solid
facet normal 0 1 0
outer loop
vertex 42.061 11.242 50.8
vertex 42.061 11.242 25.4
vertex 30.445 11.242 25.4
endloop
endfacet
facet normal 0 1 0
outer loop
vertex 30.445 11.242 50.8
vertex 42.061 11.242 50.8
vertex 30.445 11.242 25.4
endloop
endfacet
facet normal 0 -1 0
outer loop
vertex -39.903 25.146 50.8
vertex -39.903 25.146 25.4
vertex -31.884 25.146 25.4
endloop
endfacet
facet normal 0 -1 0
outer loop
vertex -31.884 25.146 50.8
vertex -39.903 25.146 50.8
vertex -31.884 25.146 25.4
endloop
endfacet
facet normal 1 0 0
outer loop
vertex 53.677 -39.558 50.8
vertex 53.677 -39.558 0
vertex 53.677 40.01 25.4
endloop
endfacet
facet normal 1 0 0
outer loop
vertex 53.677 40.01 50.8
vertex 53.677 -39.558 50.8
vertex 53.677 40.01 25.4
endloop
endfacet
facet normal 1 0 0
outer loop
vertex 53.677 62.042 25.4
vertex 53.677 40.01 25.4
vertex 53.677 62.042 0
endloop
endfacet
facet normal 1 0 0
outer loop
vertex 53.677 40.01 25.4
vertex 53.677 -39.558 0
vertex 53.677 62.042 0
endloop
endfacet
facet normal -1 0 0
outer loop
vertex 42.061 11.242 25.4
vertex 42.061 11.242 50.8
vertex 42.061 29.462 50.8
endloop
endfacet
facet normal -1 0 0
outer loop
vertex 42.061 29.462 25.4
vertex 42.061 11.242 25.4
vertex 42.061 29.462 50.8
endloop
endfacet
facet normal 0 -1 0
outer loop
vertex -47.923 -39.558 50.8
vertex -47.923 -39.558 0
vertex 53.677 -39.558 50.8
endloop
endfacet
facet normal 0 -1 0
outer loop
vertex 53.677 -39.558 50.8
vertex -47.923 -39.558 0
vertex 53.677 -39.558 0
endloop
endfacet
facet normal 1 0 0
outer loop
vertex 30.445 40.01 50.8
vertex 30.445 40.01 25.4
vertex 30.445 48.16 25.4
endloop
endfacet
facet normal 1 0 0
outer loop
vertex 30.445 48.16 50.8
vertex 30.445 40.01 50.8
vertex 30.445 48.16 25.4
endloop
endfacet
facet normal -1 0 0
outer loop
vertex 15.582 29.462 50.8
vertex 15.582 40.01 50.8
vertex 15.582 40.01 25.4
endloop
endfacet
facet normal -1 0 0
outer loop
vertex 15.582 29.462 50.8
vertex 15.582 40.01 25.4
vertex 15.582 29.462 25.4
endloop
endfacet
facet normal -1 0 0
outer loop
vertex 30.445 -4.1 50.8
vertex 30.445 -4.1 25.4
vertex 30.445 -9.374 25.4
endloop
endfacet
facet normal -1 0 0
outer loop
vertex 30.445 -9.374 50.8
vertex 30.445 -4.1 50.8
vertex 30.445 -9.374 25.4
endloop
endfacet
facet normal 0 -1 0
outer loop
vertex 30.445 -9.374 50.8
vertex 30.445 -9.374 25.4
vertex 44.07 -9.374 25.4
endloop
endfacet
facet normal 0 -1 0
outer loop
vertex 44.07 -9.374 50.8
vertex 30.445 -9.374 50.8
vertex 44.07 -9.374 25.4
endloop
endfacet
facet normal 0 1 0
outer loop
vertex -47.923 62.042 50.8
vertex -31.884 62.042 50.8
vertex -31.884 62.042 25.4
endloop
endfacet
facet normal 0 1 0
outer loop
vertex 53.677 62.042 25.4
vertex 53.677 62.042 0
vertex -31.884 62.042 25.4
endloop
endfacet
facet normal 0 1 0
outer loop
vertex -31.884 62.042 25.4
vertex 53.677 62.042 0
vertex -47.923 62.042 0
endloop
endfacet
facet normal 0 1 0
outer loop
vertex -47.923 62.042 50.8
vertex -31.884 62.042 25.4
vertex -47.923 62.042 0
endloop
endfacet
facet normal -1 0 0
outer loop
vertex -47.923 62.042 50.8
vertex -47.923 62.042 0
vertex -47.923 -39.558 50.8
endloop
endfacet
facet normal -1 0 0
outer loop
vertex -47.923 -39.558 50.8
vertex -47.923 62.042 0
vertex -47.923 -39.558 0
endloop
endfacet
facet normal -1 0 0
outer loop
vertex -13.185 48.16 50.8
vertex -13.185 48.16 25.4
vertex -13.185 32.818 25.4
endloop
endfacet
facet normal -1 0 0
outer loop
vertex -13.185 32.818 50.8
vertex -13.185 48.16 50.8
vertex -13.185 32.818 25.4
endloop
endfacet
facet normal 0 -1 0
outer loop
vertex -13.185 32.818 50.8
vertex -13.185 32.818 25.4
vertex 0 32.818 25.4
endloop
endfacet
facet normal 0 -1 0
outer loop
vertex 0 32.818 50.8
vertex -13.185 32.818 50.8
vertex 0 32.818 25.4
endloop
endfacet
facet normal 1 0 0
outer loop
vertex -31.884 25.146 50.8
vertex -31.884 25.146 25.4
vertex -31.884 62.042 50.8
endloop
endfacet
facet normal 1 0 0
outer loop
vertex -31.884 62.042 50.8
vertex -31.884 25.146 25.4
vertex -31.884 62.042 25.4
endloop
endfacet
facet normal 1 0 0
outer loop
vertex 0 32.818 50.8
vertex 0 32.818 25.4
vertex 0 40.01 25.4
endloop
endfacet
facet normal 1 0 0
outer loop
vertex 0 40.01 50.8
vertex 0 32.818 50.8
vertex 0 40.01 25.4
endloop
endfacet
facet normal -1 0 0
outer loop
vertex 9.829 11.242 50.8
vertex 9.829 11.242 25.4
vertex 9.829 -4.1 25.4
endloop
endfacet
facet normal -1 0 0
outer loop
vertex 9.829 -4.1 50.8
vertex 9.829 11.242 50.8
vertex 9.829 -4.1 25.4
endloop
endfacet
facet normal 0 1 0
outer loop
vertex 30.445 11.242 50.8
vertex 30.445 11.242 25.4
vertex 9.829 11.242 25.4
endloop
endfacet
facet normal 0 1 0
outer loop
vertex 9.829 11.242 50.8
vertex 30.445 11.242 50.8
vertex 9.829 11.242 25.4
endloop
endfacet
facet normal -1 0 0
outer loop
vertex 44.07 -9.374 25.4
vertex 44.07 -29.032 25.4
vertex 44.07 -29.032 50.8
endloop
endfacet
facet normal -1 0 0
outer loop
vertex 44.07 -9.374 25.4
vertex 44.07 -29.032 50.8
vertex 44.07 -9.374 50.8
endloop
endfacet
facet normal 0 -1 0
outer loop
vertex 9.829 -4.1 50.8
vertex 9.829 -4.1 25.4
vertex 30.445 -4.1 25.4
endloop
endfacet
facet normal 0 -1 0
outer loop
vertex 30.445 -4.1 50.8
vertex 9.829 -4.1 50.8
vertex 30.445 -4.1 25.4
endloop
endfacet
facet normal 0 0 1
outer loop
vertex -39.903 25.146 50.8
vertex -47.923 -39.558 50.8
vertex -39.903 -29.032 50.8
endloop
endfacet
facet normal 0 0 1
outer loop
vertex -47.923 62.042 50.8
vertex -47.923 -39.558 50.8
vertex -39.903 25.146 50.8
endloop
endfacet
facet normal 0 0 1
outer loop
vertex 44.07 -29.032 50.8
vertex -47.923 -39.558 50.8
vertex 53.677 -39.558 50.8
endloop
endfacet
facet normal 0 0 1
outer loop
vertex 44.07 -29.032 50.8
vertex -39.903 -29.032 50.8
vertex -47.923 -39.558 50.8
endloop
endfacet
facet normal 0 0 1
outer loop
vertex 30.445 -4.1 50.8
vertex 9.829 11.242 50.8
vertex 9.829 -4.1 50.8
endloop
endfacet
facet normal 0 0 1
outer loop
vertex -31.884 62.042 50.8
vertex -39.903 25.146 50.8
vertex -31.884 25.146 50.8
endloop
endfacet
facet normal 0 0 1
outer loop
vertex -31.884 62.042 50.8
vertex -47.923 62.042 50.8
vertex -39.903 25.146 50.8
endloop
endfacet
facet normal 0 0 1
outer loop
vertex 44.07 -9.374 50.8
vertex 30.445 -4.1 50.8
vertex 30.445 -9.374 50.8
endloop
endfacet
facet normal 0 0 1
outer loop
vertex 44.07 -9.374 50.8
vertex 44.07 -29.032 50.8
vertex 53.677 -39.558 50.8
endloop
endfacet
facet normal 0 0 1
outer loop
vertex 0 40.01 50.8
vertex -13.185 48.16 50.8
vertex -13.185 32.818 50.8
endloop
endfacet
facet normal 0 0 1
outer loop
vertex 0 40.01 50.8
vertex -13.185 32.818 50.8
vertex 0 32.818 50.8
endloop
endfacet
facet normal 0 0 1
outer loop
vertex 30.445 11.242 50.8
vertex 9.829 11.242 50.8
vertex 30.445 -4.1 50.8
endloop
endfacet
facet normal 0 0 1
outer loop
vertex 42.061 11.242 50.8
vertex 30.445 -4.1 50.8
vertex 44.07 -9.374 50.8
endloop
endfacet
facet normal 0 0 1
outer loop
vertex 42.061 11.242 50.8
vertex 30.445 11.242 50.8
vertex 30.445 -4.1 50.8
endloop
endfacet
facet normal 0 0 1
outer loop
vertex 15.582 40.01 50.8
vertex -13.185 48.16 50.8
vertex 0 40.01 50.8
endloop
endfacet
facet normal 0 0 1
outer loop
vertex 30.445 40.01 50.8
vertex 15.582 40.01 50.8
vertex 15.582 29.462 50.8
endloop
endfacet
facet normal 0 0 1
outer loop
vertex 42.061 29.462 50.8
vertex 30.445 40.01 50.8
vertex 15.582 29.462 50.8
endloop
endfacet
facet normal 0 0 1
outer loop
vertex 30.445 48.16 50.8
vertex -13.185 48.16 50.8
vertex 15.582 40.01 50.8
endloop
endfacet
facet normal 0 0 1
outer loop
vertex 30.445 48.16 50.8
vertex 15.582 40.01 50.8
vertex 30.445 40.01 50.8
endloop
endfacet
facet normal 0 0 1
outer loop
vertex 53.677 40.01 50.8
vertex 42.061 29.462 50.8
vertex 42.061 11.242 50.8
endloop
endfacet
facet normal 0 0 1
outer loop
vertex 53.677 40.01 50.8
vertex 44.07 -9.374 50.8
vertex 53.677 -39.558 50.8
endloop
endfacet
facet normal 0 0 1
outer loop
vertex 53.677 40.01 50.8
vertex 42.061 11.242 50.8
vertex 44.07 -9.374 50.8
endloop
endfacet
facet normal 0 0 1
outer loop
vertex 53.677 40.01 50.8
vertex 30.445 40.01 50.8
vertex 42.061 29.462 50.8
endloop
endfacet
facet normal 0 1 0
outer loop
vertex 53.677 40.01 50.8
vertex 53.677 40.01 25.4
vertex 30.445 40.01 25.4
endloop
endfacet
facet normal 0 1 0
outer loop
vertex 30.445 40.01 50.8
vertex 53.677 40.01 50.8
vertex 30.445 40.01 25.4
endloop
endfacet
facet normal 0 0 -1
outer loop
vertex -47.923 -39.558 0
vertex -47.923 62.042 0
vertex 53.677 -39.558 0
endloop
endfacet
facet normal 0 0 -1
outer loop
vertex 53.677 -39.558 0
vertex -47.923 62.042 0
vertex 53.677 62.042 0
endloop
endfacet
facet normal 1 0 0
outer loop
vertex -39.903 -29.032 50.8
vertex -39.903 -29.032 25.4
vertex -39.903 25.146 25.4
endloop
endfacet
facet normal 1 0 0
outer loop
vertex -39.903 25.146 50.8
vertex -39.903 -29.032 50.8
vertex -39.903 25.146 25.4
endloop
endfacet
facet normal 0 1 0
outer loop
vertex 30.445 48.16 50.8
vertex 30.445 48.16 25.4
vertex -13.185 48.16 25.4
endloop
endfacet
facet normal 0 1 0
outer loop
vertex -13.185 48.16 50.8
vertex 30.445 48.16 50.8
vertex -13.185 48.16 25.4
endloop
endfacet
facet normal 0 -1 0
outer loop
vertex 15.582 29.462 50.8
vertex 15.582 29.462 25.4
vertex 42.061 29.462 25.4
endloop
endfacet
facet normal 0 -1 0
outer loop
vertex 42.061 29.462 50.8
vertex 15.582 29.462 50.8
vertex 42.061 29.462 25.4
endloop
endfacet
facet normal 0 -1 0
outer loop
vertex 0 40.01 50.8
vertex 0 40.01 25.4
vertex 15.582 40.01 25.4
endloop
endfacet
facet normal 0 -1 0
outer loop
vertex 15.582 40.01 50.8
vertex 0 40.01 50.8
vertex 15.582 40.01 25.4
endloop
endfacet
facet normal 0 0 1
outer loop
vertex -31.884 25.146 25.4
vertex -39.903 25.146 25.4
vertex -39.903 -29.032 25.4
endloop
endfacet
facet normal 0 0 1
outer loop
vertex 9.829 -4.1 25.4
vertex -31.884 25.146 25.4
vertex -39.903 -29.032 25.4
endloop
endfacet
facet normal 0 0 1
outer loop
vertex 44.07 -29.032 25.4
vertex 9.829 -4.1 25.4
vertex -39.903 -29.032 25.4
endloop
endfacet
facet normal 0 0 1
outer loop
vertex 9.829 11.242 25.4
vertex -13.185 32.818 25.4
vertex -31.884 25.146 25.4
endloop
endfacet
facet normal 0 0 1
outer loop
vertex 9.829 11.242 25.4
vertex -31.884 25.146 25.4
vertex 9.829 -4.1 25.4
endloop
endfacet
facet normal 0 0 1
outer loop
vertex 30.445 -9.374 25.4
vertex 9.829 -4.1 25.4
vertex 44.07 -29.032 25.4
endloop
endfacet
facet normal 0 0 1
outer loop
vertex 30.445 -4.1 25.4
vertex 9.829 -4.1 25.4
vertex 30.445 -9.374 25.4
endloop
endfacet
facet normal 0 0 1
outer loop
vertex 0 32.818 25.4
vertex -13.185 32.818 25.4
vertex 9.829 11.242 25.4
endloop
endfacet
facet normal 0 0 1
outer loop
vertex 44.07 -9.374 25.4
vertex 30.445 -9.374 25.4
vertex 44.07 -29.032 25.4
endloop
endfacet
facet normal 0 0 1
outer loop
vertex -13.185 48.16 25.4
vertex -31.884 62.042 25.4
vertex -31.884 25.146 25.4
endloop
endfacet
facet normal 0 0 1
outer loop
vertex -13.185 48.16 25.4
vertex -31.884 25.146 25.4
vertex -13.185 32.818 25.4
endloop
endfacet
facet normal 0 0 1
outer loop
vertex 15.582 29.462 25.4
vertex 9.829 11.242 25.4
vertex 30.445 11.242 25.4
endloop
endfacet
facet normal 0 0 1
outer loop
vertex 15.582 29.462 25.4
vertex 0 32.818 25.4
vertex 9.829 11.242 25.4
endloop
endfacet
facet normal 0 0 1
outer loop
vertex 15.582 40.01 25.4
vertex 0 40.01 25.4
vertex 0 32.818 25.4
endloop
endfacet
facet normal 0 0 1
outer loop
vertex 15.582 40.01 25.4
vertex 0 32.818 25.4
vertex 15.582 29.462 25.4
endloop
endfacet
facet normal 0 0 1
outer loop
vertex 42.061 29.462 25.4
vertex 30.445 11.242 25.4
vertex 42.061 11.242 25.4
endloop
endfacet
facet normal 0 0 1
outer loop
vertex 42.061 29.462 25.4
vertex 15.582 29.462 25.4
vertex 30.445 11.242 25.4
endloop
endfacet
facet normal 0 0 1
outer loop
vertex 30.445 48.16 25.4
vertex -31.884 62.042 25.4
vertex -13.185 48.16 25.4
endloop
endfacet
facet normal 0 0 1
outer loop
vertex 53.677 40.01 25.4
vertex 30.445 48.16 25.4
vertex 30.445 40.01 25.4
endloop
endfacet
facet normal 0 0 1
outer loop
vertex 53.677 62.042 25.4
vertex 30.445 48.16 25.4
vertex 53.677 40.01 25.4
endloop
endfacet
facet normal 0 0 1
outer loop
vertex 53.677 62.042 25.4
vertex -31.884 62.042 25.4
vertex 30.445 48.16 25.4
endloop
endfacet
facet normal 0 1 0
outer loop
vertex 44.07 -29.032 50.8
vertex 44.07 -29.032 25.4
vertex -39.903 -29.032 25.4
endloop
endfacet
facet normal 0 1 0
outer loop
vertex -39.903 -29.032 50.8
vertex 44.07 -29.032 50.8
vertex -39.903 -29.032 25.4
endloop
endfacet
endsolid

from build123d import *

# Parameters (mm, degrees)
F0_W     = 101.6
F0_H     = 101.6
F1_DEPTH = 25.4
F2_W     = 9.6067792356
F2_H     = 19.6575643495
F2_W_2   = 23.4931828454
F2_H_2   = 10.5259682656
F2_W_3   = 8.0198350638
F2_H_3   = 12.465775013
F2_H_4   = 41.7123902589
F2_W_4   = 11.6157357857
F2_H_5   = 18.2192062081
F3_DEPTH = 25.4


# Not quite as in the source:
# - ends of sketch curves that miss each other by under 0.0002 mm in the source are joined


with BuildPart() as f1:
    # F0 (on Top) → F1 (new body)
    with BuildSketch(Plane.XY):
        with Locations((2.876713872, 11.2423545628)):
            Rectangle(F0_W, F0_H)
    extrude(amount=F1_DEPTH)

    # F2 (on face) → F3 (join)
    with BuildSketch(Plane.XY.offset(25.4)):
        Polygon((-31.8836160004, 25.1464881003), (-31.8836160004, 62.0423545628), (-47.923286128, 62.0423545628), (-47.923286128, 25.1464881003), (-39.9034510642, 25.1464881003), align=None)
        Polygon((0, 32.8177288175), (0, 40.0095209479), (0, 48.1602139771), (-13.1849600002, 48.1602139771), (-13.1849600002, 32.8177288175), align=None)
        Polygon((15.5822057277, 40.0095209479), (30.4452423006, 40.0095209479), (30.4452423006, 48.1602139771), (0, 48.1602139771), (0, 40.0095209479), align=None)
        Polygon((42.0609780863, 29.4615607709), (53.676713872, 29.4615607709), (53.676713872, 40.0095209479), (30.4452423006, 40.0095209479), (15.5822057277, 40.0095209479), (15.5822057277, 29.4615607709), align=None)
        Polygon((30.4452423006, -4.1001341306), (30.4452423006, 11.2423545628), (9.8287723958, 11.2423505634), (9.8287723958, -4.1001341306), align=None)
        Polygon((44.0699346364, -9.3741128221), (53.676713872, -9.3741128221), (53.676713872, 11.2423545628), (42.0609780863, 11.2423545628), (30.4452423006, 11.2423545628), (30.4452423006, -4.1001341306), (30.4452423006, -9.3741128221), (42.0609780863, -9.3741128221), align=None)
        with Locations((48.8733242542, -19.2028949969)):
            Rectangle(F2_W, F2_H)
        Polygon((53.676713872, -39.5576454372), (53.676713872, -29.0316771716), (44.0699346364, -29.0316771716), (42.0609780863, -29.0316771716), (-8.390433155, -29.0316771716), (-8.390433155, -39.5576454372), align=None)
        with Locations((-20.1370245777, -34.2946613044)):
            Rectangle(F2_W_2, F2_H_2)
        with Locations((-43.9133685961, -22.7987896651)):
            Rectangle(F2_W_3, F2_H_3)
        Polygon((-47.923286128, -39.5576454372), (-31.8836160004, -39.5576454372), (-31.8836160004, -29.0316771716), (-39.9034510642, -29.0316771716), (-47.923286128, -29.0316771716), align=None)
        with Locations((-43.9133685961, 4.2902929708)):
            Rectangle(F2_W_3, F2_H_4)
        with Locations((47.8688459791, 20.3519576668)):
            Rectangle(F2_W_4, F2_H_5)
    extrude(amount=F3_DEPTH)


solid = f1.part
